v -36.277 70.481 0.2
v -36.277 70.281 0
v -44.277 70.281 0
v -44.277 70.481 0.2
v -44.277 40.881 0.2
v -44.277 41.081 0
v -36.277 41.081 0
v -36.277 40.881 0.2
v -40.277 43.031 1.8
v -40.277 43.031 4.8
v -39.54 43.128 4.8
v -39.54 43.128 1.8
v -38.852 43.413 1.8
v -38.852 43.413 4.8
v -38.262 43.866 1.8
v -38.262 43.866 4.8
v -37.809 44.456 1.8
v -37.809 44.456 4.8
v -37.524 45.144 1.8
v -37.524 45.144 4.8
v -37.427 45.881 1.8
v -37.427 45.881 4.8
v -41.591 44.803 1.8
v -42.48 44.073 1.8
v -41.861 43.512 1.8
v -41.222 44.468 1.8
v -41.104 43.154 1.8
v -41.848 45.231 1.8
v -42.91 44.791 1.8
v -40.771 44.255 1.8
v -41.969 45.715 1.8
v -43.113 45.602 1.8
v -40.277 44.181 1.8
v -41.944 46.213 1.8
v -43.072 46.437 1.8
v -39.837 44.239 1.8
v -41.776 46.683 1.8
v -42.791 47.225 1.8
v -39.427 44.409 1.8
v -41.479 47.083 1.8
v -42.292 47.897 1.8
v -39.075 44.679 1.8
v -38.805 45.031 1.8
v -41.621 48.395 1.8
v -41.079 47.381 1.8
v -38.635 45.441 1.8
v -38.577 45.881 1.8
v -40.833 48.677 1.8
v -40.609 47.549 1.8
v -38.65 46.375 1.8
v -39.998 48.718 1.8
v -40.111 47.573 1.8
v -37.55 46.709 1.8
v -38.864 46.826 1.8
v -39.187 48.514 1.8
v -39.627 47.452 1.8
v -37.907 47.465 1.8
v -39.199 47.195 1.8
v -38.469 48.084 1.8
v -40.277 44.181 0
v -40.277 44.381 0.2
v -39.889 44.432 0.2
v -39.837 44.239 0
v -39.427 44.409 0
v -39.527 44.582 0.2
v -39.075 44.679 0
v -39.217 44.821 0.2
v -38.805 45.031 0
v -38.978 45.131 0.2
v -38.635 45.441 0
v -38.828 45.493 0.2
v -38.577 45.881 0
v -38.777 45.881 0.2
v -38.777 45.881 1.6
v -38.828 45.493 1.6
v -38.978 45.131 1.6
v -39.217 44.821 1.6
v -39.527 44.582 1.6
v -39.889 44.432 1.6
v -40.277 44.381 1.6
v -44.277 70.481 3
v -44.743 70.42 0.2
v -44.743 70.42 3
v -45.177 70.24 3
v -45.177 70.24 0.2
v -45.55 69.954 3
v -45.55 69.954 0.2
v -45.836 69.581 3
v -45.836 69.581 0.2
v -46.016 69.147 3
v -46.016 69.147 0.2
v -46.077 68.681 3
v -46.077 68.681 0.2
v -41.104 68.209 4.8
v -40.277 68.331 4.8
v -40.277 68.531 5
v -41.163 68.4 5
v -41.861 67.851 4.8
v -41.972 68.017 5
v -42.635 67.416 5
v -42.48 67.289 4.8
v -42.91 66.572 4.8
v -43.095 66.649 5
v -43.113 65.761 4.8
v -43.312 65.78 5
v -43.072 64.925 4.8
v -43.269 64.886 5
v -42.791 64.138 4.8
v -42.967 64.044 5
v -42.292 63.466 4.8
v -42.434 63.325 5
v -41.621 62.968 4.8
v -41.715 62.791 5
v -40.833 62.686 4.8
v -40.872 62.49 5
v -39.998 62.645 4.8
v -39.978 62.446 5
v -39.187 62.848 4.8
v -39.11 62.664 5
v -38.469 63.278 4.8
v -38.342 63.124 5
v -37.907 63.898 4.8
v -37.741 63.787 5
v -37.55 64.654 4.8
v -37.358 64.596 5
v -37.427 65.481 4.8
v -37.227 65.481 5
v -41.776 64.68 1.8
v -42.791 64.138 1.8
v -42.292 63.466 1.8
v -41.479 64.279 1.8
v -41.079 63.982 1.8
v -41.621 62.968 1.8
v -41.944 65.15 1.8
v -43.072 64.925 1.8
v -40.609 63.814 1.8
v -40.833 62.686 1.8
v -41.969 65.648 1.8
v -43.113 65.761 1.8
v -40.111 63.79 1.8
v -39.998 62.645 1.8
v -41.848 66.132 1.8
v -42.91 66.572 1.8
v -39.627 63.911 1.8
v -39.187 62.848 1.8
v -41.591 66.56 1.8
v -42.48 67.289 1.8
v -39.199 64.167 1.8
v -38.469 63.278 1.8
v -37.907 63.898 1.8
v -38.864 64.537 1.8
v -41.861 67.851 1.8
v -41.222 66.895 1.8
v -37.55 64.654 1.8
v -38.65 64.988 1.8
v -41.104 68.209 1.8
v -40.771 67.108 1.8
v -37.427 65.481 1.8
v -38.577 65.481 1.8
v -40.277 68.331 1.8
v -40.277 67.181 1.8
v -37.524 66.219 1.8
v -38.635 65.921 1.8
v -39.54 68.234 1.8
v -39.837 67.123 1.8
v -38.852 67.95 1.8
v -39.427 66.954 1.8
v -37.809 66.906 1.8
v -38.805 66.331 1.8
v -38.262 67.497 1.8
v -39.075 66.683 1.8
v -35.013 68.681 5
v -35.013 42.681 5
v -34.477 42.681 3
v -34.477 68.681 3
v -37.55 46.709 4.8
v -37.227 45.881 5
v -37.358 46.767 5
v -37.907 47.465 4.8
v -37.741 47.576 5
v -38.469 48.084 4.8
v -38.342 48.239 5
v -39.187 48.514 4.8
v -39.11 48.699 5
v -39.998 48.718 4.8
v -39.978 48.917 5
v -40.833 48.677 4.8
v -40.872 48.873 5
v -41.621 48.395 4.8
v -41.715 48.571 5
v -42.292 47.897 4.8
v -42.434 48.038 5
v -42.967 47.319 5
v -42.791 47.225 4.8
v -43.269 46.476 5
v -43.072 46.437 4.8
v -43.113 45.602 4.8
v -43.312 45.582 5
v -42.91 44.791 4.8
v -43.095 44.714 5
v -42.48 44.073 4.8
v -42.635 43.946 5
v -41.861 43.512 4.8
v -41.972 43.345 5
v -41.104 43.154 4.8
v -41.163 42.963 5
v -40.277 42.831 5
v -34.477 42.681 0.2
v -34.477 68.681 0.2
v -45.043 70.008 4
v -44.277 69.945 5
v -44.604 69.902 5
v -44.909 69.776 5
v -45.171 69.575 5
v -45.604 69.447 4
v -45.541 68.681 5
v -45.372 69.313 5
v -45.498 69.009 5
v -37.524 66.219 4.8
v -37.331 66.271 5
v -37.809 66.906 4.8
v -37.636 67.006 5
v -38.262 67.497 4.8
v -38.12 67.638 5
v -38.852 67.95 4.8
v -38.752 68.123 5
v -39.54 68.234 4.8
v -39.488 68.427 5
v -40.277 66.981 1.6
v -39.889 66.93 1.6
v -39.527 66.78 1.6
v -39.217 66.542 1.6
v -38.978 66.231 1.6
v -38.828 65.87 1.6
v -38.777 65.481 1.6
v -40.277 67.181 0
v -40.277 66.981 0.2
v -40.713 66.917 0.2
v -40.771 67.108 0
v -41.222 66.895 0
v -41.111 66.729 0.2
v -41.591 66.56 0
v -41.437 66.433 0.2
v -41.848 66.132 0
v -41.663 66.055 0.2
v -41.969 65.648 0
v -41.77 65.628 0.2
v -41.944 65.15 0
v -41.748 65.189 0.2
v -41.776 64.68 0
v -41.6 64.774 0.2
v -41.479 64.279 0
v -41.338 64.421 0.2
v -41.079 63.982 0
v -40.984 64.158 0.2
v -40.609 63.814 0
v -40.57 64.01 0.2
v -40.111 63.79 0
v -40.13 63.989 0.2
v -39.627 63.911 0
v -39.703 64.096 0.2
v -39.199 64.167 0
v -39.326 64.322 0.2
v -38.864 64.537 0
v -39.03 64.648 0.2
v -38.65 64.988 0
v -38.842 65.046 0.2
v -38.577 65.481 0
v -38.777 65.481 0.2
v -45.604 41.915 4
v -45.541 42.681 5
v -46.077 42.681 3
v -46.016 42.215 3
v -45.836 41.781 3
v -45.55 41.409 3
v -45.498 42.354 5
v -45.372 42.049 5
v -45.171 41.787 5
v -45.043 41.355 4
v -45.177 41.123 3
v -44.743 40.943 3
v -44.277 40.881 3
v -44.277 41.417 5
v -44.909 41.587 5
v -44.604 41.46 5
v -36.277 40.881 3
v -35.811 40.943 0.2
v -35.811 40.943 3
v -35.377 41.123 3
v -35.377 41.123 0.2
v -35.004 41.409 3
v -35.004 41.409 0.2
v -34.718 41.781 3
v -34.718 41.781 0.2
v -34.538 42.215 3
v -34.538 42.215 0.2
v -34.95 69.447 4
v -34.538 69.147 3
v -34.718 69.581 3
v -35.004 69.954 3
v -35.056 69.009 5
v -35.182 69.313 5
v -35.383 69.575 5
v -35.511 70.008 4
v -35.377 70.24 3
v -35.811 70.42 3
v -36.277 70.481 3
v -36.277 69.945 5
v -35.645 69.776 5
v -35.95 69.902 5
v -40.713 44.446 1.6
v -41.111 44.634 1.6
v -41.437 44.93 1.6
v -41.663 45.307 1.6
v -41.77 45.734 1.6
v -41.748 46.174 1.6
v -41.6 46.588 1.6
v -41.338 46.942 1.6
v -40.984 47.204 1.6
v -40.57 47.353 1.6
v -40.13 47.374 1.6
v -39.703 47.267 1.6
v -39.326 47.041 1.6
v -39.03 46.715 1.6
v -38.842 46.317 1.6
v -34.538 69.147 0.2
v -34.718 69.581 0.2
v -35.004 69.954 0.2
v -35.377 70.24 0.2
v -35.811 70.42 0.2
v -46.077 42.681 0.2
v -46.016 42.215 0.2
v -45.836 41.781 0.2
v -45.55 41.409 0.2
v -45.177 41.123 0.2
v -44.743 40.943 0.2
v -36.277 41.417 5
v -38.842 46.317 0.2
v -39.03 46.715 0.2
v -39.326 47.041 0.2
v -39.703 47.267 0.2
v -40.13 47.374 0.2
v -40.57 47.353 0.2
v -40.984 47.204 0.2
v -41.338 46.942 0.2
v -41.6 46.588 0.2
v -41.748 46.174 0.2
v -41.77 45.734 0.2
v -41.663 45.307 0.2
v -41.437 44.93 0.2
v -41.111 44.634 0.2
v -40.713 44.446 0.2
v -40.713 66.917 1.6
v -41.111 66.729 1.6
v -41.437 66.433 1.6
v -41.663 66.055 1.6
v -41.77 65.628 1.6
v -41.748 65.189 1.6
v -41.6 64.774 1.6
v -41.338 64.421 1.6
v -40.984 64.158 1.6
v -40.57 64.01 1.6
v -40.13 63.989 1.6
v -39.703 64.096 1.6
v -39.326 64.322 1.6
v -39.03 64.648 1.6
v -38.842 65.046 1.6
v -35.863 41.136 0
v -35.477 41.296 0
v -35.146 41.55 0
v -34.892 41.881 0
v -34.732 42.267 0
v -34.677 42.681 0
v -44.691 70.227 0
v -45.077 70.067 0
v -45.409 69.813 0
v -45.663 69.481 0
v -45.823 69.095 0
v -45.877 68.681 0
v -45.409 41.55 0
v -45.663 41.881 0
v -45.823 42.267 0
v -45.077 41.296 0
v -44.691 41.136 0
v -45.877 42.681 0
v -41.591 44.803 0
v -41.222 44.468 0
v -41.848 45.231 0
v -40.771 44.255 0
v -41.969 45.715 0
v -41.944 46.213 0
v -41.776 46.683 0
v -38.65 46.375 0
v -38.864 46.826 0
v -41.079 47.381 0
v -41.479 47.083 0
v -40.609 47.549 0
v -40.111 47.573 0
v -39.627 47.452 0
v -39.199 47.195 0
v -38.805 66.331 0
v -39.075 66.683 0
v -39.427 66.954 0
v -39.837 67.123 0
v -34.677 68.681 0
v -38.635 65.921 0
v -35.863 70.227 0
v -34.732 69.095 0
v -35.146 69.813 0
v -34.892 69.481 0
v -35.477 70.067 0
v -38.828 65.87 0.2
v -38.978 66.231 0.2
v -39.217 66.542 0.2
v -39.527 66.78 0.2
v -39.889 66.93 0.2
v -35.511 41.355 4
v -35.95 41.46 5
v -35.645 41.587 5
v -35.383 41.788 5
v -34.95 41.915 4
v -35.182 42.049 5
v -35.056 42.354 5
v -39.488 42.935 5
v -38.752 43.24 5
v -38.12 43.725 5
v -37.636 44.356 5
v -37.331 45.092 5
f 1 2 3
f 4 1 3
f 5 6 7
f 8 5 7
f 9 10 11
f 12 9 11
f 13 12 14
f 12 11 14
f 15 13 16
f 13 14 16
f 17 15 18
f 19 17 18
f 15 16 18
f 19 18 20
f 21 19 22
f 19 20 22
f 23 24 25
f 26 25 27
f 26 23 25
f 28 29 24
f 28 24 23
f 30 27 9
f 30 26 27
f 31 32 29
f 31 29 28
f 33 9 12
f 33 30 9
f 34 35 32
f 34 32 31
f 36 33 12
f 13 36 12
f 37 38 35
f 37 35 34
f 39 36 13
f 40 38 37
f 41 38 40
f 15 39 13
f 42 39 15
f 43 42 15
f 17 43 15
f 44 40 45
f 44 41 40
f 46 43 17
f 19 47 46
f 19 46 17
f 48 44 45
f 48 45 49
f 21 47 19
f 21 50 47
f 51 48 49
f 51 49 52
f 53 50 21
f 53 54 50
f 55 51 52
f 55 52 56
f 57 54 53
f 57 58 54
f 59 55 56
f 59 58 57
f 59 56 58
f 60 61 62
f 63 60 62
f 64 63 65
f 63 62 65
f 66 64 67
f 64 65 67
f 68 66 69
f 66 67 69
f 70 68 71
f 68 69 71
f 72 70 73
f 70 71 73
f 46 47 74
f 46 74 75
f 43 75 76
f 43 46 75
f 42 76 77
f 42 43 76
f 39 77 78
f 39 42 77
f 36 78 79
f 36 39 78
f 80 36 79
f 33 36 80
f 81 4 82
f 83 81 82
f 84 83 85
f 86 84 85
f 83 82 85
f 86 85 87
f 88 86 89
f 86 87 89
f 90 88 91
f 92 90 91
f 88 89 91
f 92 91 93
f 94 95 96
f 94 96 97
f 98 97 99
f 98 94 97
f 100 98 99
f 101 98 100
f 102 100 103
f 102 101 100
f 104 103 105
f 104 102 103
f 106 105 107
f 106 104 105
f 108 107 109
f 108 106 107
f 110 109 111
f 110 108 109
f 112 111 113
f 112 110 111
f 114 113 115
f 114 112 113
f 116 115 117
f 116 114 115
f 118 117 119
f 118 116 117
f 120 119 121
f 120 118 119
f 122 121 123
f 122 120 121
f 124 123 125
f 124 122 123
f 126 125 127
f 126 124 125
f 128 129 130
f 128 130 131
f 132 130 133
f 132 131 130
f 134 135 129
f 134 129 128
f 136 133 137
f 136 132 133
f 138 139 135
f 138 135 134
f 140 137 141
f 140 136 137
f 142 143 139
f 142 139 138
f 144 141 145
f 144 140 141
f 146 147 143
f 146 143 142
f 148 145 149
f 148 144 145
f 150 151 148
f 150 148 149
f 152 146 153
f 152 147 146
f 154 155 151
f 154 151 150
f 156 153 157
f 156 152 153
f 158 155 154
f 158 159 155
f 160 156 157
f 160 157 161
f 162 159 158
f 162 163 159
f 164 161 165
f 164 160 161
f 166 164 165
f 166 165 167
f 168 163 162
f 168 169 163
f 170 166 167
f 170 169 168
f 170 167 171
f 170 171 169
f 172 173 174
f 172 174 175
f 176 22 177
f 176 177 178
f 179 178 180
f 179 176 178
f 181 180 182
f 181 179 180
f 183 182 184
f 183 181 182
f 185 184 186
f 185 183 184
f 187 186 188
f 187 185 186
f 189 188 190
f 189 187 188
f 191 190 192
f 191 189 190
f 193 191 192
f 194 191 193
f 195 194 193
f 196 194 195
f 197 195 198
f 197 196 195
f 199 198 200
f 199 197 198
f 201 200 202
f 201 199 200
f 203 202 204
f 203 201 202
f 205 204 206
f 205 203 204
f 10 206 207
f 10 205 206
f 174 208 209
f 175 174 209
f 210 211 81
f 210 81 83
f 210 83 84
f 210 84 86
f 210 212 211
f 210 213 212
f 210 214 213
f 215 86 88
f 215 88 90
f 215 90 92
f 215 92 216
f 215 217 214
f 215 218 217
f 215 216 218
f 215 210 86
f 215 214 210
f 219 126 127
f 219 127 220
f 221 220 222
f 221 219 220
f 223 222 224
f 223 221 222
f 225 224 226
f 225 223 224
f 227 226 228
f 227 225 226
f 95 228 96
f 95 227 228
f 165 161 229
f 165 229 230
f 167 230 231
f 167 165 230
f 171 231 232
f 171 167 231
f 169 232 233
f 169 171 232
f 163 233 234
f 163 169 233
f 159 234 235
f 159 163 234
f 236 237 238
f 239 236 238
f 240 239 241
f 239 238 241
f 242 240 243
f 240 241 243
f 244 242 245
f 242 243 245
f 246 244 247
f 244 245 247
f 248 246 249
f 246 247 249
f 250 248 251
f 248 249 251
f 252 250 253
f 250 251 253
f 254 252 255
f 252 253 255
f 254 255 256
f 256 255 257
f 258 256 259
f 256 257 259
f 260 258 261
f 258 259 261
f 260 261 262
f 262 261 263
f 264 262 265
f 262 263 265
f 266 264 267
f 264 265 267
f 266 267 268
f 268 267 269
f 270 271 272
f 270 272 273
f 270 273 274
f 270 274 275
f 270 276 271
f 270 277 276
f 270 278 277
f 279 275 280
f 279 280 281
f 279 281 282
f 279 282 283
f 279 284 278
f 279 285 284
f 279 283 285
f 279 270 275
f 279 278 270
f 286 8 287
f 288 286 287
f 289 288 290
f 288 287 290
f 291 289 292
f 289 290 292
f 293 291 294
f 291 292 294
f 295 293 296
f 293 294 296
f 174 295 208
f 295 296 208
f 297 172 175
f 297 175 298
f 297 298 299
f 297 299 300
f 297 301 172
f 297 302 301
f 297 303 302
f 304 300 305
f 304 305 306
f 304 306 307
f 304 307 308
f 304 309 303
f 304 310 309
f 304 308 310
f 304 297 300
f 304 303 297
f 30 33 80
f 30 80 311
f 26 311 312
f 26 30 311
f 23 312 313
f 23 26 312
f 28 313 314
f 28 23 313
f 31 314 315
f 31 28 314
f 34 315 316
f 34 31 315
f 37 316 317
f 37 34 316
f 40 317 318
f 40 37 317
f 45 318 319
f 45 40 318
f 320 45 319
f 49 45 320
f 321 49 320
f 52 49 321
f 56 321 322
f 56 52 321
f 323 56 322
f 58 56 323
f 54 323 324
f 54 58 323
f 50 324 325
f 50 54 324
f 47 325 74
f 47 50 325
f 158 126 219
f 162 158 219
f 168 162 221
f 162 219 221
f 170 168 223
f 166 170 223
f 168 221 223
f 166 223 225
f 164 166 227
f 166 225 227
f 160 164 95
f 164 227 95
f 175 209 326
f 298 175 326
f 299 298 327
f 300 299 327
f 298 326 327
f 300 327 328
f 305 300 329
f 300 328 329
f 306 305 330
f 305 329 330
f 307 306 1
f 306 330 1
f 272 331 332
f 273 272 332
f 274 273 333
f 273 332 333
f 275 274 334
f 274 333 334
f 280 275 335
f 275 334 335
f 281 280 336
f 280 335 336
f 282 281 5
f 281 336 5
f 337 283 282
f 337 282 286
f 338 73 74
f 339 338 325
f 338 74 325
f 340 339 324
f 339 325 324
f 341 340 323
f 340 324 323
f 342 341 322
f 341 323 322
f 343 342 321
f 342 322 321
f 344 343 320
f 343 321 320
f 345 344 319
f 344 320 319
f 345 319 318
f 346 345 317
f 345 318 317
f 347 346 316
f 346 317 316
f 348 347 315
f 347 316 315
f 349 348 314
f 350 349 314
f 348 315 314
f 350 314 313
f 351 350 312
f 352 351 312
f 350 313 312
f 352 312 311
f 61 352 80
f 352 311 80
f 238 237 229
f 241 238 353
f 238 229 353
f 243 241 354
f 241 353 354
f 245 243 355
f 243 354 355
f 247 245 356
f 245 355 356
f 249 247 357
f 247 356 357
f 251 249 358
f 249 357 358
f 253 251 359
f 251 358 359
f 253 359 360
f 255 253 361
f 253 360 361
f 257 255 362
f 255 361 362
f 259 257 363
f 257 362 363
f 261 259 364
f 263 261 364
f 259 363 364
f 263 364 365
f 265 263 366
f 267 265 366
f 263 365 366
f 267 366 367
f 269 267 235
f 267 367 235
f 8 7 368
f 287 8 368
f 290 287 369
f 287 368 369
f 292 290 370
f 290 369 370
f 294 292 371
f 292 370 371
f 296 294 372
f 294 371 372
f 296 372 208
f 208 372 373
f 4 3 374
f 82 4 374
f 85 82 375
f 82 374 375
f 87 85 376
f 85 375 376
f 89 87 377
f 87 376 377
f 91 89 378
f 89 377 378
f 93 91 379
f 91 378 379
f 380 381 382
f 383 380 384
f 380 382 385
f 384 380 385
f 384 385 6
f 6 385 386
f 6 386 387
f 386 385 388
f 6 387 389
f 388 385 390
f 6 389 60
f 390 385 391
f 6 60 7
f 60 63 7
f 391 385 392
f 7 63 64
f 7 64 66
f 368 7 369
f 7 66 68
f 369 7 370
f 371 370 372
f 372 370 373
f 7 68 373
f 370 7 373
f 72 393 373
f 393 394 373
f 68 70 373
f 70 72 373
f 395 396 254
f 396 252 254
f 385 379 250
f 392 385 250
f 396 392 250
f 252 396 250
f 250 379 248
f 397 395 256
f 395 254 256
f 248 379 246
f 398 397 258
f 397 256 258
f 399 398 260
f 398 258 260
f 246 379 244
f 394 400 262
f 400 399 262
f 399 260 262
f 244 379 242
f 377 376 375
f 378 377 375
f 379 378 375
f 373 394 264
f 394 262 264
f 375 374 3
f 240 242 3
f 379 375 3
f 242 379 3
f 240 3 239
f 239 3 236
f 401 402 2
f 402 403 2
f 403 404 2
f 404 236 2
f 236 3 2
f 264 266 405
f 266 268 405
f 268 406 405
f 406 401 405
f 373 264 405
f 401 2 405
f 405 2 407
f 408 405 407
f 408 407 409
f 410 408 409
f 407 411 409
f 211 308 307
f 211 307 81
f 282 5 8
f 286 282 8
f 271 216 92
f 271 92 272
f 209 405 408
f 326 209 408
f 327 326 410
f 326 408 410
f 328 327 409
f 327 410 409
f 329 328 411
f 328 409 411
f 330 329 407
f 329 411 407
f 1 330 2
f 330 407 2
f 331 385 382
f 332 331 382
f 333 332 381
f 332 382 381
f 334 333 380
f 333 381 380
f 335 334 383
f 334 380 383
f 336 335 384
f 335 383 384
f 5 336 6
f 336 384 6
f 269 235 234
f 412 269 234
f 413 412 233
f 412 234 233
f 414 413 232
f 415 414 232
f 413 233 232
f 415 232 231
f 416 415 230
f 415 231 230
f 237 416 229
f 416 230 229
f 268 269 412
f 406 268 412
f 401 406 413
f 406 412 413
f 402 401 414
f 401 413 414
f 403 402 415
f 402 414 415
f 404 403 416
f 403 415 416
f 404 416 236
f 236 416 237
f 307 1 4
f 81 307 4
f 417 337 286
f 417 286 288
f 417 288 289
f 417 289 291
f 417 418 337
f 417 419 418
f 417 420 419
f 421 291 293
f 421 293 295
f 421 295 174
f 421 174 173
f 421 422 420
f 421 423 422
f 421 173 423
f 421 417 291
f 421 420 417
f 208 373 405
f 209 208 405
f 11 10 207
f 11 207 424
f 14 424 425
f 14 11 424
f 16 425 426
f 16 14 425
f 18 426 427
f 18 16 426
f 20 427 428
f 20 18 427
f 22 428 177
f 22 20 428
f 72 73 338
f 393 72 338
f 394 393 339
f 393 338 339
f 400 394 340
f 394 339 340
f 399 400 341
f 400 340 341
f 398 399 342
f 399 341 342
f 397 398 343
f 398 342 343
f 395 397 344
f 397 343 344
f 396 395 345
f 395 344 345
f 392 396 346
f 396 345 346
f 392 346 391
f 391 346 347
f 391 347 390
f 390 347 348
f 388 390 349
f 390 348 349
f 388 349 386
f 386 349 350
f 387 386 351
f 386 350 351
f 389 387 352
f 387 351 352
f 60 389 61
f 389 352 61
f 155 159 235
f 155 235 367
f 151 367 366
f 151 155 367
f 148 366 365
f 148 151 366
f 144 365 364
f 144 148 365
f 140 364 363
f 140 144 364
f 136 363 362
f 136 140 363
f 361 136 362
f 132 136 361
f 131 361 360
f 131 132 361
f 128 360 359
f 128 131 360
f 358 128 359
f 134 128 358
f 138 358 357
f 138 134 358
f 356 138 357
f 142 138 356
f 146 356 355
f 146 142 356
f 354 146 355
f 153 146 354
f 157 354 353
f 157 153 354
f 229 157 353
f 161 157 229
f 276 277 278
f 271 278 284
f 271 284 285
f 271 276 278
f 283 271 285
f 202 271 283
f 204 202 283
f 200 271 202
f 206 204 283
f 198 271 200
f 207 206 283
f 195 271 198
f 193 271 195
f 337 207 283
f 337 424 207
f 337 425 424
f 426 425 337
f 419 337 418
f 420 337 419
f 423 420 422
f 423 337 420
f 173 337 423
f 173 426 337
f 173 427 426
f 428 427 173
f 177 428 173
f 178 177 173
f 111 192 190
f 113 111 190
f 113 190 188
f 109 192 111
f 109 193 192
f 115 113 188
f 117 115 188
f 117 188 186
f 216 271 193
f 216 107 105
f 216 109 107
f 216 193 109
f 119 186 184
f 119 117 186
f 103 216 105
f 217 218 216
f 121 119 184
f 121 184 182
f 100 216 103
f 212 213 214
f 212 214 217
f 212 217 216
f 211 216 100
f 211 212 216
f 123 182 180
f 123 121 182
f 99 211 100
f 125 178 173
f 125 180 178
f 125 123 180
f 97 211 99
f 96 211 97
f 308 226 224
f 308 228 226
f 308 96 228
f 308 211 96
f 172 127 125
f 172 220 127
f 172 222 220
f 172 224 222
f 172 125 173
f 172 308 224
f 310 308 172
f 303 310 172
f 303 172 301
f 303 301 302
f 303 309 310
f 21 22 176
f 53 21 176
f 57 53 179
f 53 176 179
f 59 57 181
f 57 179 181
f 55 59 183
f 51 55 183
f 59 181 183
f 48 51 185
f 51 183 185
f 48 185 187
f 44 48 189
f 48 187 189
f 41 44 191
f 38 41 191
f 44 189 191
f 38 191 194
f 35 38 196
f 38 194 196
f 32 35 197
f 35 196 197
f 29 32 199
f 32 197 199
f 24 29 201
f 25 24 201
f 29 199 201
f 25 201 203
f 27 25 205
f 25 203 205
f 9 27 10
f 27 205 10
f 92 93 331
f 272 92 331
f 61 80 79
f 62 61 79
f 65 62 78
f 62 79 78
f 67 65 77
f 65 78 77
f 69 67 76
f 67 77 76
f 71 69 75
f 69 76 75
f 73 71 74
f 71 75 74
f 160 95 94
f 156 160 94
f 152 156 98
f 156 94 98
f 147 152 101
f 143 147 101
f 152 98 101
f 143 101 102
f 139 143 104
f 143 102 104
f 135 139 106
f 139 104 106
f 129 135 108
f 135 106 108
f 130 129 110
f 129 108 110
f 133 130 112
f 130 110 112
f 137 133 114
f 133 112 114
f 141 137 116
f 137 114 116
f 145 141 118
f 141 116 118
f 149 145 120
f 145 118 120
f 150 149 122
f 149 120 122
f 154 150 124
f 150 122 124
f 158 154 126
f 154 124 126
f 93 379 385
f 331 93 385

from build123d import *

# Parameters (mm, degrees)
F1_DEPTH = 5
F3_DEPTH = 25
F4_DEPTH = 3.2
F5_SIZE  = 0.2
F6_SIZE2 = 0.535898
F6_SIZE  = 2


with BuildPart() as f1:
    # F0 (on Top) → F1 (new body)
    with BuildSketch(Plane.XY):
        with BuildLine():
            Line((-34.477164, 42.681355), (-34.477164, 68.681355))
            ThreePointArc((-34.477164, 68.681355), (-35.004372, 69.954148), (-36.277164, 70.481355))
            Line((-36.277164, 70.481355), (-44.277164, 70.481355))
            ThreePointArc((-44.277164, 70.481355), (-45.549957, 69.954148), (-46.077164, 68.681355))
            Line((-46.077164, 68.681355), (-46.077164, 42.681355))
            ThreePointArc((-46.077164, 42.681355), (-45.549957, 41.408563), (-44.277164, 40.881355))
            Line((-44.277164, 40.881355), (-36.277164, 40.881355))
            ThreePointArc((-36.277164, 40.881355), (-35.004372, 41.408563), (-34.477164, 42.681355))
        make_face()
    extrude(amount=F1_DEPTH)

    # F2 (on face) → F3 (cut)
    with BuildSketch(Plane.XY.offset(5)):
        with BuildLine():
            ThreePointArc((-38.777164, 65.481355), (-39.216504, 66.542015), (-40.277164, 66.981355))
            ThreePointArc((-40.277164, 66.981355), (-41.337825, 64.420695), (-38.777164, 65.481355))
        make_face()
        with BuildLine():
            ThreePointArc((-38.777164, 45.881355), (-41.337825, 46.942015), (-40.277164, 44.381355))
            ThreePointArc((-40.277164, 44.381355), (-39.216504, 44.820695), (-38.777164, 45.881355))
        make_face()
    extrude(amount=-F3_DEPTH, mode=Mode.SUBTRACT)

    # F2 (on face) → F4 (cut)
    with BuildSketch(Plane.XY.offset(5)):
        with BuildLine():
            ThreePointArc((-37.427164, 65.481355), (-38.26191, 67.49661), (-40.277164, 68.331355))
            ThreePointArc((-40.277164, 68.331355), (-42.292419, 63.466101), (-37.427164, 65.481355))
        make_face()
        with BuildLine():
            ThreePointArc((-38.777164, 65.481355), (-41.337825, 64.420695), (-40.277164, 66.981355))
            ThreePointArc((-40.277164, 66.981355), (-39.216504, 66.542015), (-38.777164, 65.481355))
        make_face(mode=Mode.SUBTRACT)
        with BuildLine():
            ThreePointArc((-37.427164, 45.881355), (-42.292419, 47.89661), (-40.277164, 43.031355))
            ThreePointArc((-40.277164, 43.031355), (-38.26191, 43.866101), (-37.427164, 45.881355))
        make_face()
        with BuildLine():
            ThreePointArc((-38.777164, 45.881355), (-39.216504, 44.820695), (-40.277164, 44.381355))
            ThreePointArc((-40.277164, 44.381355), (-41.337825, 46.942015), (-38.777164, 45.881355))
        make_face(mode=Mode.SUBTRACT)
    extrude(amount=-F4_DEPTH, mode=Mode.SUBTRACT)

    # F5
    f5_edges = [f1.edges().sort_by_distance(p)[0] for p in [
        (-41.777164, 65.481355, 1.8),
        (-40.277164, 47.381355, 1.8),
        (-34.477164, 55.681355, 0),
        (-35.004372, 41.408563, 0),
        (-35.004372, 69.954148, 0),
        (-40.277164, 40.881355, 0),
        (-40.277164, 70.481355, 0),
        (-45.549957, 41.408563, 0),
        (-45.549957, 69.954148, 0),
        (-46.077164, 55.681355, 0),
        (-40.277164, 47.381355, 0),
        (-41.777164, 65.481355, 0),
        (-43.127164, 65.481355, 5),
        (-40.277164, 48.731355, 5),
    ]]
    chamfer(f5_edges, length=F5_SIZE)

    # F6
    f6_edges = [f1.edges().sort_by_distance(p)[0] for p in [
        (-34.477164, 55.681355, 5),
    ]]
    chamfer(f6_edges, length=F6_SIZE, length2=F6_SIZE2)


solid = f1.part
